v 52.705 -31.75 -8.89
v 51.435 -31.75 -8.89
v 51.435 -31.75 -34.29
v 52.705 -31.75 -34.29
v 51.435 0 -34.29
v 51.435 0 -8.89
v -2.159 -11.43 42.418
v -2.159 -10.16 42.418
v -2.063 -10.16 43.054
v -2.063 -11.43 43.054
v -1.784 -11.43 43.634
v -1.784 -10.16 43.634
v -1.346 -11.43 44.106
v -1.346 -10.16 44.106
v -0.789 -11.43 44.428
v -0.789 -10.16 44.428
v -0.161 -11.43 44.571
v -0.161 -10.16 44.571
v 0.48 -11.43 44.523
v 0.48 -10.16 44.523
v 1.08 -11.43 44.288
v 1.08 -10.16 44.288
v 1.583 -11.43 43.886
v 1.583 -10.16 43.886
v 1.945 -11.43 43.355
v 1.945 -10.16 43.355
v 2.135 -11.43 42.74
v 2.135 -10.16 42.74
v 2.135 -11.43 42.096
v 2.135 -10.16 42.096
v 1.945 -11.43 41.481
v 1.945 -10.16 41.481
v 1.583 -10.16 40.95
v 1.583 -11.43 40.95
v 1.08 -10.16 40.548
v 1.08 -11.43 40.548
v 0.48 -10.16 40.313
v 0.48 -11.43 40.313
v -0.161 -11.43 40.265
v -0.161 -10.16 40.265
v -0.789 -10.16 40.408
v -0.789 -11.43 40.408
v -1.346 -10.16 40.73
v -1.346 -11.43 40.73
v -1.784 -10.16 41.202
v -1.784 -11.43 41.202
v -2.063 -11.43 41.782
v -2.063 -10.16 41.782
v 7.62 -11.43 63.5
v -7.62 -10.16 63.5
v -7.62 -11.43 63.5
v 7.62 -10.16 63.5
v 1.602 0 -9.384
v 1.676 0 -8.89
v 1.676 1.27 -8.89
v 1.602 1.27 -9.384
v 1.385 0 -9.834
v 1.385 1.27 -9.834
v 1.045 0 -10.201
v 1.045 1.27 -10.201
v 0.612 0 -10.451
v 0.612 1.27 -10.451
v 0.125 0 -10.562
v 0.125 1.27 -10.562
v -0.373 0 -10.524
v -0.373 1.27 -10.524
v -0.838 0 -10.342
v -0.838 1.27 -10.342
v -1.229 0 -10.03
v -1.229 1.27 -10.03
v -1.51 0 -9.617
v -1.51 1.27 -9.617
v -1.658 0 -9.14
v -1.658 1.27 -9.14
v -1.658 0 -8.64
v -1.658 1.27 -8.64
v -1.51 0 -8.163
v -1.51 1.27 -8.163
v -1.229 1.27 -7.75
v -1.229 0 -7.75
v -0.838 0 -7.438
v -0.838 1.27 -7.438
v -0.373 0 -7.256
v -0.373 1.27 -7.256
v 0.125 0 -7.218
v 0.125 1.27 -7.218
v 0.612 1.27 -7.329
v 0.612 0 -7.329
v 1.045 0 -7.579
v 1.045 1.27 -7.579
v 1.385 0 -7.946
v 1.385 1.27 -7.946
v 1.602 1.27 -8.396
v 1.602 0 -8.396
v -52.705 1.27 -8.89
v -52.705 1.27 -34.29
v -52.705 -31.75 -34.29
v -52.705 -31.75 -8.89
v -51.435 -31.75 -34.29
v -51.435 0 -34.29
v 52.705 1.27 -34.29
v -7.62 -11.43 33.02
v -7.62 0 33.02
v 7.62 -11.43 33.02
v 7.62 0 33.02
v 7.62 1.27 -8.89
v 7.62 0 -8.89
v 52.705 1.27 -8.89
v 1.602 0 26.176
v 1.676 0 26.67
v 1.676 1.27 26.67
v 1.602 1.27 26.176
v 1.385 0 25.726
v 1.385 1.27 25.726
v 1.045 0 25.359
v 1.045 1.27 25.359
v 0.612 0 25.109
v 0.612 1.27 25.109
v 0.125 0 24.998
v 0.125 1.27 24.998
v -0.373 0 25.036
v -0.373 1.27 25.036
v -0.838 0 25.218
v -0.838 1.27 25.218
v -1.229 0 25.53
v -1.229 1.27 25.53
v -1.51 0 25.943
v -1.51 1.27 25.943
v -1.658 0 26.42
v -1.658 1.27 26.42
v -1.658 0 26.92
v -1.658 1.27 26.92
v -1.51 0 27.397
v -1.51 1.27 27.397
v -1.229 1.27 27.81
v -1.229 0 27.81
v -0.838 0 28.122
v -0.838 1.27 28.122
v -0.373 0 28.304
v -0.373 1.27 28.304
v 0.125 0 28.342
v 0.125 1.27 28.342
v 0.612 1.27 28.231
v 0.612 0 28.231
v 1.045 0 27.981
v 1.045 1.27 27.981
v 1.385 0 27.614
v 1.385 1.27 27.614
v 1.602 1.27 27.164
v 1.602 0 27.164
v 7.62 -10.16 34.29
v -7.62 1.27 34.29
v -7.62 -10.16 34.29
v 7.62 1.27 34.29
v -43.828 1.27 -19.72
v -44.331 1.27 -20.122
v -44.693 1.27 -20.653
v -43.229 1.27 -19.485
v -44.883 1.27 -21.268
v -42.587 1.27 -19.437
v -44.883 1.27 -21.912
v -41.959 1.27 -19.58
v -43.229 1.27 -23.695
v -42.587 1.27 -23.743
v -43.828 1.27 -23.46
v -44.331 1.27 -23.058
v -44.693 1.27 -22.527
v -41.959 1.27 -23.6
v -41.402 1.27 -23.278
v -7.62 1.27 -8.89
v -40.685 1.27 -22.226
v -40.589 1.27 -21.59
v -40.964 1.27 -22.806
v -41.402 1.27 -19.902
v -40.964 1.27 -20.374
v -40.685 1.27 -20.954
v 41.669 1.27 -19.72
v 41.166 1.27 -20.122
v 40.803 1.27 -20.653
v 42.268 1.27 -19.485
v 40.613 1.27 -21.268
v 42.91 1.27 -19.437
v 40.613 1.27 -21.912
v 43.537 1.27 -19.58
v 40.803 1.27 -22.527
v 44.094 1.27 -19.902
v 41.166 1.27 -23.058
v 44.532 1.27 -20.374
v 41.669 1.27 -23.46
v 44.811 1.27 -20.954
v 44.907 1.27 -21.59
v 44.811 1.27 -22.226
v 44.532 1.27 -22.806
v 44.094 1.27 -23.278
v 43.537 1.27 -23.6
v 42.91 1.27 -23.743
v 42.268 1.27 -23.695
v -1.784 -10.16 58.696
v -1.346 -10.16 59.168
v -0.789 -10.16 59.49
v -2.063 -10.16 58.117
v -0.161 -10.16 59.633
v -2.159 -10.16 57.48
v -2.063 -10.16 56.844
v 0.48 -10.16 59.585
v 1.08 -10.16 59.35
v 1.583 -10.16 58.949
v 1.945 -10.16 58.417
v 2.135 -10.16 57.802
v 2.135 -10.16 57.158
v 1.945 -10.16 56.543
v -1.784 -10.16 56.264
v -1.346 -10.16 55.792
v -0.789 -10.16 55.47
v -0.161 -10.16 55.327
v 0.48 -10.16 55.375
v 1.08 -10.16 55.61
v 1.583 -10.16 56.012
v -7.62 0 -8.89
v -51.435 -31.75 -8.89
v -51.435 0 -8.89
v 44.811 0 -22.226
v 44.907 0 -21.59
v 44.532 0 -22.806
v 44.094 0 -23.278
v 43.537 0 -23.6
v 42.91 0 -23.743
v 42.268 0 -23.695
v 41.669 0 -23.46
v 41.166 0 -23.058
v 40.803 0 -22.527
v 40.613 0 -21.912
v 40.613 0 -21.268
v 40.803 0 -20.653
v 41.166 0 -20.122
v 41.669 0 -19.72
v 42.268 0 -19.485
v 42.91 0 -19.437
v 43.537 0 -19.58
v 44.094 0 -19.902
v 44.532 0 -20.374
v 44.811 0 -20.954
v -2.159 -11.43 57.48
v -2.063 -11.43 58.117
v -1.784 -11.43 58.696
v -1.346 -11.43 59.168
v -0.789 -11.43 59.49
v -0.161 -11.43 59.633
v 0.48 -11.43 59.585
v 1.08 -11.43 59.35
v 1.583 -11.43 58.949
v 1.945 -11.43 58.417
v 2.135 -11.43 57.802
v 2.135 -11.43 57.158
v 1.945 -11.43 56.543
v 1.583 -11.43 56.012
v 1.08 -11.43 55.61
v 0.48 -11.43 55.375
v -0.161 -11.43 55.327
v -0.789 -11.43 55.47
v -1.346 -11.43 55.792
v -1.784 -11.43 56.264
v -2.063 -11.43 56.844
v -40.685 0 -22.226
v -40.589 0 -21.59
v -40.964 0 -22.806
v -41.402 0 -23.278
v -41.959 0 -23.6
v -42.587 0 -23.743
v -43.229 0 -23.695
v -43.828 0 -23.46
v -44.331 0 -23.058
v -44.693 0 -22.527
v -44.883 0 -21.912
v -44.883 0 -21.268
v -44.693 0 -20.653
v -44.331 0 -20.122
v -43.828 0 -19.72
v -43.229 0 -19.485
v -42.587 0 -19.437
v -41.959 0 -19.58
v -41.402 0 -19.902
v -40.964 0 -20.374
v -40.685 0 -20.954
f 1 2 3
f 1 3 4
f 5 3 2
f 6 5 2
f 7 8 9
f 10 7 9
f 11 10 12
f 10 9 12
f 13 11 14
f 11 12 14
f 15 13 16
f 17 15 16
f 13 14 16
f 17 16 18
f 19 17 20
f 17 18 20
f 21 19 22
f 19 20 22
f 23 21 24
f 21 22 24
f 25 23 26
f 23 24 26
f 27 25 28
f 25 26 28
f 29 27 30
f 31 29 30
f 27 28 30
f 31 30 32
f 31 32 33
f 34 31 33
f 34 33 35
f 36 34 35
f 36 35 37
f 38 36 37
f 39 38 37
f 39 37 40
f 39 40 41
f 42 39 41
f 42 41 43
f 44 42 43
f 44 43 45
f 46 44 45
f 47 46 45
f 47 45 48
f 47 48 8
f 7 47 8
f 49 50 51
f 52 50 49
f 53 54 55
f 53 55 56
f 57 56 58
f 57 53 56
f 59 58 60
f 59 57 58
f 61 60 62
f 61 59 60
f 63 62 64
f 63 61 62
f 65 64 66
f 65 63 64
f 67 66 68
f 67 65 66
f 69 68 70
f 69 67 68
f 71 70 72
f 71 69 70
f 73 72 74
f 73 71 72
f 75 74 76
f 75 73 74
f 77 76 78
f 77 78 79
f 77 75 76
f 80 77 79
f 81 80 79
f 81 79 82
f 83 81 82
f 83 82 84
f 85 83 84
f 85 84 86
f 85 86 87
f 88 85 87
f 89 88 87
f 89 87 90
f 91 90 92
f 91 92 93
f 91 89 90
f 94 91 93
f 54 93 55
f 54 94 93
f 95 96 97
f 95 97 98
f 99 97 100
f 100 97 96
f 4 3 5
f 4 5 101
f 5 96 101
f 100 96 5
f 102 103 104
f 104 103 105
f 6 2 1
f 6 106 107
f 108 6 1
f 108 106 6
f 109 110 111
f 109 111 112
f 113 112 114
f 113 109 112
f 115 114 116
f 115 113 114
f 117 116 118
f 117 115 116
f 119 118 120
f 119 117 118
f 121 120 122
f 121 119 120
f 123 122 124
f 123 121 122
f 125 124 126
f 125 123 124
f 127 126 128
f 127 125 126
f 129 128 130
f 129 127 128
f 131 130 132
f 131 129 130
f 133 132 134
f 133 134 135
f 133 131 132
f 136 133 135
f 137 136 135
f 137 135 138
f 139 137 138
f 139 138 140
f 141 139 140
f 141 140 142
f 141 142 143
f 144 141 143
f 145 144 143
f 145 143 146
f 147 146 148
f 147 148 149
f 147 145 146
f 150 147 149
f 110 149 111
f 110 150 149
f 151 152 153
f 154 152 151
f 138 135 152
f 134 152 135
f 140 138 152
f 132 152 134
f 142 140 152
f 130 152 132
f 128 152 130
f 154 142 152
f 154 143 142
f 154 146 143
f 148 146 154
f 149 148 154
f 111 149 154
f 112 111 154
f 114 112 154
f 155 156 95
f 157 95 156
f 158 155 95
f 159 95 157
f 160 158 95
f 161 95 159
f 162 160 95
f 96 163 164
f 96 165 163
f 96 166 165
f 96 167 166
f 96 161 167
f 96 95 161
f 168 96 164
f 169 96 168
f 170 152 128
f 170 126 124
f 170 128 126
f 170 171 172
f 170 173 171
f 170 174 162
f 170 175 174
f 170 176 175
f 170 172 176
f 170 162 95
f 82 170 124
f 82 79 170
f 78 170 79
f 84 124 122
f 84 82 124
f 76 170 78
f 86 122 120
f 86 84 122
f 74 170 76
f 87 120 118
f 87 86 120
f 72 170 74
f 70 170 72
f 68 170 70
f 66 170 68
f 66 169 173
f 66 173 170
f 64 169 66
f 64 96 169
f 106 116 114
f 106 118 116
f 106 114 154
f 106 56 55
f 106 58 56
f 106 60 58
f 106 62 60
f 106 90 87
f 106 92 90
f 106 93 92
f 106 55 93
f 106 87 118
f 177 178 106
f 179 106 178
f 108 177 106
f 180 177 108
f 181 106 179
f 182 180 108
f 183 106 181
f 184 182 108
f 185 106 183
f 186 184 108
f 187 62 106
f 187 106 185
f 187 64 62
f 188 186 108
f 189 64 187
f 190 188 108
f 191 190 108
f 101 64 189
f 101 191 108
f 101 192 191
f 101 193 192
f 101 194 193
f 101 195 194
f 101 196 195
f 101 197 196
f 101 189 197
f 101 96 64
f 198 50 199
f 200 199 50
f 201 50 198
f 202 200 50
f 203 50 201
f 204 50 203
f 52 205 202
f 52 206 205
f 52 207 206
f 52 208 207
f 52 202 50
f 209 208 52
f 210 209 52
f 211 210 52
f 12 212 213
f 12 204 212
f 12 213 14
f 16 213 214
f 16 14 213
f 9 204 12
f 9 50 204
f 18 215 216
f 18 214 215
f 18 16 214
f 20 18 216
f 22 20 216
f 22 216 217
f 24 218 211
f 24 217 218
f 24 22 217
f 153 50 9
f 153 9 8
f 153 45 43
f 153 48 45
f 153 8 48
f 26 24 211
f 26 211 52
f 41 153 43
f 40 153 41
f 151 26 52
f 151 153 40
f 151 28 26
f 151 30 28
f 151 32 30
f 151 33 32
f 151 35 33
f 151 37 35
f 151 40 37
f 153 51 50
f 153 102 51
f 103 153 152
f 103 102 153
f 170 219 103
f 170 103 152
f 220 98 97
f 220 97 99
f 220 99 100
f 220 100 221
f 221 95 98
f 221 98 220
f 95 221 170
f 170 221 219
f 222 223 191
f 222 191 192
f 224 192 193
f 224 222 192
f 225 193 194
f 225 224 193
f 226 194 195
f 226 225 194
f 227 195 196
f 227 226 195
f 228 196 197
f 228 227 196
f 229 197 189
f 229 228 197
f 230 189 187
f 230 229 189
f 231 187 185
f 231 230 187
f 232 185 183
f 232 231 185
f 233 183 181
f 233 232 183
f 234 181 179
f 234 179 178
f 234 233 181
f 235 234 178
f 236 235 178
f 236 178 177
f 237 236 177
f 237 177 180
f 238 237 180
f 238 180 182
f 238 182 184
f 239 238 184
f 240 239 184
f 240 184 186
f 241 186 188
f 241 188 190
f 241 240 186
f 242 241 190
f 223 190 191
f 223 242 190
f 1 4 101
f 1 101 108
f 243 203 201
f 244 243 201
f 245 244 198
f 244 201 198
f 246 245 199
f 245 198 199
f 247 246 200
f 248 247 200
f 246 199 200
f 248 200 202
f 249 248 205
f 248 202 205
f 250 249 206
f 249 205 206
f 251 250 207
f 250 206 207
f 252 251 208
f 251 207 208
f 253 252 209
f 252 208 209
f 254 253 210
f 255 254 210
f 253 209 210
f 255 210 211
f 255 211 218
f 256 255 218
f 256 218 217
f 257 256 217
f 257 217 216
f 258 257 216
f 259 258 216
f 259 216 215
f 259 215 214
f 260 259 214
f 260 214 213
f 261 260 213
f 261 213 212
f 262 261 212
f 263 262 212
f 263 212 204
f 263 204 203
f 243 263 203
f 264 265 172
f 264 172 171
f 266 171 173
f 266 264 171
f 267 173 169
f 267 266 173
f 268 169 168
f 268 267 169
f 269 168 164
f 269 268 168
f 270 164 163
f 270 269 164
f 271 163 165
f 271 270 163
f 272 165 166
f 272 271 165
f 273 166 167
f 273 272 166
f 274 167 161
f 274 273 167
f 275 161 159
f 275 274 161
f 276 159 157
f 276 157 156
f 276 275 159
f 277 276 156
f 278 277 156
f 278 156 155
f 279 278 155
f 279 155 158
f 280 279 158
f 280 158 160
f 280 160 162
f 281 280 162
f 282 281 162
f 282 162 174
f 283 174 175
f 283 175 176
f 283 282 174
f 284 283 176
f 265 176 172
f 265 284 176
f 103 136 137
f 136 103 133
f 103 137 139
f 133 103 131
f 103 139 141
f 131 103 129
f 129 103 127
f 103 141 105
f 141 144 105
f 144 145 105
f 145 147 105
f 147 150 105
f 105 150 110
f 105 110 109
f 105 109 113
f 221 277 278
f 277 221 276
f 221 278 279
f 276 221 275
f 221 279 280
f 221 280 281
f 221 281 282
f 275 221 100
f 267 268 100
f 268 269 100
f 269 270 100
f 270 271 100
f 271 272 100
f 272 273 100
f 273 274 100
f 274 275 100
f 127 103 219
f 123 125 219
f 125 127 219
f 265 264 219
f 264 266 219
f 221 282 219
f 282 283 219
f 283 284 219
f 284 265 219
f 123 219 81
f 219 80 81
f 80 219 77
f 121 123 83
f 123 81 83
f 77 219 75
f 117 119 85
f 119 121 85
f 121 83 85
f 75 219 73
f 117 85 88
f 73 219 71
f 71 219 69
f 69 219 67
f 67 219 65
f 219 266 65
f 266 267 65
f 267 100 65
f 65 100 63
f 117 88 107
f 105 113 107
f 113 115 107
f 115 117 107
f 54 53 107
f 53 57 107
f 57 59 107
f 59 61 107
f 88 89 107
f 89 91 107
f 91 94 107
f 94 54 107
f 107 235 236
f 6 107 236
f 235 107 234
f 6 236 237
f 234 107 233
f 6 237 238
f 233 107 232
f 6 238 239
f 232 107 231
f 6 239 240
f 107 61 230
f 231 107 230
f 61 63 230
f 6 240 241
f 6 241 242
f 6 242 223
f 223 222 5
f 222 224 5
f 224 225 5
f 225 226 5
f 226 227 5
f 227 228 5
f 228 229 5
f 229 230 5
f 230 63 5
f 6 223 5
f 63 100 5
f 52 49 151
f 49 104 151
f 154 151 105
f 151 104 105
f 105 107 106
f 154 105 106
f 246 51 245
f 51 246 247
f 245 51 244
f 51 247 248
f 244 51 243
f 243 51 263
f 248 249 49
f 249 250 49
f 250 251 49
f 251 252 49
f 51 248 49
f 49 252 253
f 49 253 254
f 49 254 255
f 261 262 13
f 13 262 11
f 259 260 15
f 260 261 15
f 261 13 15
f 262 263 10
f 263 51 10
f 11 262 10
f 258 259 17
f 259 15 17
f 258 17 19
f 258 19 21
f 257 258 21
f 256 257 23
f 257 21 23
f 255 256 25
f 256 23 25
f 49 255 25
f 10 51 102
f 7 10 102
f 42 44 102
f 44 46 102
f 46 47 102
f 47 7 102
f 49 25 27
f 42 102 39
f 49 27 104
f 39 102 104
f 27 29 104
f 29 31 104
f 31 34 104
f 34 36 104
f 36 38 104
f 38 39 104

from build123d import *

# Parameters (mm, degrees)
BSSXTRD_CLIPTOPFACE_OUTLINE_R   = 1.6764
BSSXTRD_CLIPTOPFACE_OUTLINE_R_2 = 2.159
BSSXTRD_CLIPTOPFACE_DEPTH       = 1.27
SKTCH_CLIPSTANDOFFCROSSSEC_W    = 15.24
SKTCH_CLIPSTANDOFFCROSSSEC_H    = 1.27
BSSXTRD_CLIPLEG_DEPTH           = 11.43
SKTCH_CLIPFOOTCROSSSEC_W        = 15.24
SKTCH_CLIPFOOTCROSSSEC_H        = 1.27
BSSXTRD_CLIPFOOT_DEPTH          = 29.21
CTXTRD_CLIPFOOTHOLES_REACH      = 85.311
SKTCH_CLIPFOOTHOLES_R           = 2.159
SKTCH_CLIPSTANDOFFCROSSSEC_3_W  = 1.27
SKTCH_CLIPSTANDOFFCROSSSEC_3_H  = 25.4
BSSXTRD_CLIPTABS_DEPTH          = 31.75


# Read off the part's stored shape, not the designer's step: BssXtrd_ClipTopFace
with BuildPart() as part:
    # BssXtrd_ClipTopFace outline → BssXtrd_ClipTopFace (new body)
    with BuildSketch(Plane(origin=(0, 0, 0), x_dir=(1, 0, 0), z_dir=(0, 1, 0))):
        Polygon((-7.62, -34.29), (7.62, -34.29), (7.62, 8.89), (52.705, 8.89), (52.705, 34.29), (-52.705, 34.29), (-52.705, 8.89), (-7.62, 8.89), align=None)
        with Locations((0, -26.67)):
            Circle(BSSXTRD_CLIPTOPFACE_OUTLINE_R, mode=Mode.SUBTRACT)
        with Locations((-42.7482, 21.59)):
            Circle(BSSXTRD_CLIPTOPFACE_OUTLINE_R_2, mode=Mode.SUBTRACT)
        with Locations((0, 8.89)):
            Circle(BSSXTRD_CLIPTOPFACE_OUTLINE_R, mode=Mode.SUBTRACT)
        with Locations((42.7482, 21.59)):
            Circle(BSSXTRD_CLIPTOPFACE_OUTLINE_R_2, mode=Mode.SUBTRACT)
    extrude(amount=BSSXTRD_CLIPTOPFACE_DEPTH)

    # Sktch_ClipStandoffCrossSec → BssXtrd_ClipLeg (add)
    with BuildSketch(Plane.XZ):
        with Locations((0, 33.655)):
            Rectangle(SKTCH_CLIPSTANDOFFCROSSSEC_W, SKTCH_CLIPSTANDOFFCROSSSEC_H)
    extrude(amount=BSSXTRD_CLIPLEG_DEPTH)

    # Sktch_ClipFootCrossSec → BssXtrd_ClipFoot (add)
    with BuildSketch(Plane.XY.offset(34.29)):
        with Locations((0, -10.795)):
            Rectangle(SKTCH_CLIPFOOTCROSSSEC_W, SKTCH_CLIPFOOTCROSSSEC_H)
    extrude(amount=BSSXTRD_CLIPFOOT_DEPTH)

    # Sktch_ClipFootHoles → CtXtrd_ClipFootHoles (cut, up to next)
    with BuildSketch(Plane(origin=(0, -10.16, 0), x_dir=(1, 0, 0), z_dir=(0, 1, 0)), mode=Mode.PRIVATE) as ctxtrd_clipfootholes_sk1:
        with Locations(Location((0, -42.418, 0), (0, 0, 180))):
            Circle(SKTCH_CLIPFOOTHOLES_R)
    ctxtrd_clipfootholes_tool1 = extrude(ctxtrd_clipfootholes_sk1.sketch, amount=-CTXTRD_CLIPFOOTHOLES_REACH, mode=Mode.PRIVATE) & part.part
    # Sktch_ClipFootHoles → CtXtrd_ClipFootHoles (cut, up to next)
    with BuildSketch(Plane(origin=(0, -10.16, 0), x_dir=(1, 0, 0), z_dir=(0, 1, 0)), mode=Mode.PRIVATE) as ctxtrd_clipfootholes_sk2:
        with Locations(Location((0, -57.4802, 0), (0, 0, 180))):
            Circle(SKTCH_CLIPFOOTHOLES_R)
    ctxtrd_clipfootholes_tool2 = extrude(ctxtrd_clipfootholes_sk2.sketch, amount=-CTXTRD_CLIPFOOTHOLES_REACH, mode=Mode.PRIVATE) & part.part
    add(ctxtrd_clipfootholes_tool1.solids().sort_by_distance((0, -10.16, 42.418))[0], mode=Mode.SUBTRACT)
    add(ctxtrd_clipfootholes_tool2.solids().sort_by_distance((0, -10.16, 57.4802))[0], mode=Mode.SUBTRACT)

    # Sktch_ClipStandoffCrossSec<3> → BssXtrd_ClipTabs (add)
    with BuildSketch(Plane.XZ):
        with Locations((52.07, -21.59)):
            Rectangle(SKTCH_CLIPSTANDOFFCROSSSEC_3_W, SKTCH_CLIPSTANDOFFCROSSSEC_3_H)
        with Locations((-52.07, -21.59)):
            Rectangle(SKTCH_CLIPSTANDOFFCROSSSEC_3_W, SKTCH_CLIPSTANDOFFCROSSSEC_3_H)
    extrude(amount=BSSXTRD_CLIPTABS_DEPTH)


solid = part.part
